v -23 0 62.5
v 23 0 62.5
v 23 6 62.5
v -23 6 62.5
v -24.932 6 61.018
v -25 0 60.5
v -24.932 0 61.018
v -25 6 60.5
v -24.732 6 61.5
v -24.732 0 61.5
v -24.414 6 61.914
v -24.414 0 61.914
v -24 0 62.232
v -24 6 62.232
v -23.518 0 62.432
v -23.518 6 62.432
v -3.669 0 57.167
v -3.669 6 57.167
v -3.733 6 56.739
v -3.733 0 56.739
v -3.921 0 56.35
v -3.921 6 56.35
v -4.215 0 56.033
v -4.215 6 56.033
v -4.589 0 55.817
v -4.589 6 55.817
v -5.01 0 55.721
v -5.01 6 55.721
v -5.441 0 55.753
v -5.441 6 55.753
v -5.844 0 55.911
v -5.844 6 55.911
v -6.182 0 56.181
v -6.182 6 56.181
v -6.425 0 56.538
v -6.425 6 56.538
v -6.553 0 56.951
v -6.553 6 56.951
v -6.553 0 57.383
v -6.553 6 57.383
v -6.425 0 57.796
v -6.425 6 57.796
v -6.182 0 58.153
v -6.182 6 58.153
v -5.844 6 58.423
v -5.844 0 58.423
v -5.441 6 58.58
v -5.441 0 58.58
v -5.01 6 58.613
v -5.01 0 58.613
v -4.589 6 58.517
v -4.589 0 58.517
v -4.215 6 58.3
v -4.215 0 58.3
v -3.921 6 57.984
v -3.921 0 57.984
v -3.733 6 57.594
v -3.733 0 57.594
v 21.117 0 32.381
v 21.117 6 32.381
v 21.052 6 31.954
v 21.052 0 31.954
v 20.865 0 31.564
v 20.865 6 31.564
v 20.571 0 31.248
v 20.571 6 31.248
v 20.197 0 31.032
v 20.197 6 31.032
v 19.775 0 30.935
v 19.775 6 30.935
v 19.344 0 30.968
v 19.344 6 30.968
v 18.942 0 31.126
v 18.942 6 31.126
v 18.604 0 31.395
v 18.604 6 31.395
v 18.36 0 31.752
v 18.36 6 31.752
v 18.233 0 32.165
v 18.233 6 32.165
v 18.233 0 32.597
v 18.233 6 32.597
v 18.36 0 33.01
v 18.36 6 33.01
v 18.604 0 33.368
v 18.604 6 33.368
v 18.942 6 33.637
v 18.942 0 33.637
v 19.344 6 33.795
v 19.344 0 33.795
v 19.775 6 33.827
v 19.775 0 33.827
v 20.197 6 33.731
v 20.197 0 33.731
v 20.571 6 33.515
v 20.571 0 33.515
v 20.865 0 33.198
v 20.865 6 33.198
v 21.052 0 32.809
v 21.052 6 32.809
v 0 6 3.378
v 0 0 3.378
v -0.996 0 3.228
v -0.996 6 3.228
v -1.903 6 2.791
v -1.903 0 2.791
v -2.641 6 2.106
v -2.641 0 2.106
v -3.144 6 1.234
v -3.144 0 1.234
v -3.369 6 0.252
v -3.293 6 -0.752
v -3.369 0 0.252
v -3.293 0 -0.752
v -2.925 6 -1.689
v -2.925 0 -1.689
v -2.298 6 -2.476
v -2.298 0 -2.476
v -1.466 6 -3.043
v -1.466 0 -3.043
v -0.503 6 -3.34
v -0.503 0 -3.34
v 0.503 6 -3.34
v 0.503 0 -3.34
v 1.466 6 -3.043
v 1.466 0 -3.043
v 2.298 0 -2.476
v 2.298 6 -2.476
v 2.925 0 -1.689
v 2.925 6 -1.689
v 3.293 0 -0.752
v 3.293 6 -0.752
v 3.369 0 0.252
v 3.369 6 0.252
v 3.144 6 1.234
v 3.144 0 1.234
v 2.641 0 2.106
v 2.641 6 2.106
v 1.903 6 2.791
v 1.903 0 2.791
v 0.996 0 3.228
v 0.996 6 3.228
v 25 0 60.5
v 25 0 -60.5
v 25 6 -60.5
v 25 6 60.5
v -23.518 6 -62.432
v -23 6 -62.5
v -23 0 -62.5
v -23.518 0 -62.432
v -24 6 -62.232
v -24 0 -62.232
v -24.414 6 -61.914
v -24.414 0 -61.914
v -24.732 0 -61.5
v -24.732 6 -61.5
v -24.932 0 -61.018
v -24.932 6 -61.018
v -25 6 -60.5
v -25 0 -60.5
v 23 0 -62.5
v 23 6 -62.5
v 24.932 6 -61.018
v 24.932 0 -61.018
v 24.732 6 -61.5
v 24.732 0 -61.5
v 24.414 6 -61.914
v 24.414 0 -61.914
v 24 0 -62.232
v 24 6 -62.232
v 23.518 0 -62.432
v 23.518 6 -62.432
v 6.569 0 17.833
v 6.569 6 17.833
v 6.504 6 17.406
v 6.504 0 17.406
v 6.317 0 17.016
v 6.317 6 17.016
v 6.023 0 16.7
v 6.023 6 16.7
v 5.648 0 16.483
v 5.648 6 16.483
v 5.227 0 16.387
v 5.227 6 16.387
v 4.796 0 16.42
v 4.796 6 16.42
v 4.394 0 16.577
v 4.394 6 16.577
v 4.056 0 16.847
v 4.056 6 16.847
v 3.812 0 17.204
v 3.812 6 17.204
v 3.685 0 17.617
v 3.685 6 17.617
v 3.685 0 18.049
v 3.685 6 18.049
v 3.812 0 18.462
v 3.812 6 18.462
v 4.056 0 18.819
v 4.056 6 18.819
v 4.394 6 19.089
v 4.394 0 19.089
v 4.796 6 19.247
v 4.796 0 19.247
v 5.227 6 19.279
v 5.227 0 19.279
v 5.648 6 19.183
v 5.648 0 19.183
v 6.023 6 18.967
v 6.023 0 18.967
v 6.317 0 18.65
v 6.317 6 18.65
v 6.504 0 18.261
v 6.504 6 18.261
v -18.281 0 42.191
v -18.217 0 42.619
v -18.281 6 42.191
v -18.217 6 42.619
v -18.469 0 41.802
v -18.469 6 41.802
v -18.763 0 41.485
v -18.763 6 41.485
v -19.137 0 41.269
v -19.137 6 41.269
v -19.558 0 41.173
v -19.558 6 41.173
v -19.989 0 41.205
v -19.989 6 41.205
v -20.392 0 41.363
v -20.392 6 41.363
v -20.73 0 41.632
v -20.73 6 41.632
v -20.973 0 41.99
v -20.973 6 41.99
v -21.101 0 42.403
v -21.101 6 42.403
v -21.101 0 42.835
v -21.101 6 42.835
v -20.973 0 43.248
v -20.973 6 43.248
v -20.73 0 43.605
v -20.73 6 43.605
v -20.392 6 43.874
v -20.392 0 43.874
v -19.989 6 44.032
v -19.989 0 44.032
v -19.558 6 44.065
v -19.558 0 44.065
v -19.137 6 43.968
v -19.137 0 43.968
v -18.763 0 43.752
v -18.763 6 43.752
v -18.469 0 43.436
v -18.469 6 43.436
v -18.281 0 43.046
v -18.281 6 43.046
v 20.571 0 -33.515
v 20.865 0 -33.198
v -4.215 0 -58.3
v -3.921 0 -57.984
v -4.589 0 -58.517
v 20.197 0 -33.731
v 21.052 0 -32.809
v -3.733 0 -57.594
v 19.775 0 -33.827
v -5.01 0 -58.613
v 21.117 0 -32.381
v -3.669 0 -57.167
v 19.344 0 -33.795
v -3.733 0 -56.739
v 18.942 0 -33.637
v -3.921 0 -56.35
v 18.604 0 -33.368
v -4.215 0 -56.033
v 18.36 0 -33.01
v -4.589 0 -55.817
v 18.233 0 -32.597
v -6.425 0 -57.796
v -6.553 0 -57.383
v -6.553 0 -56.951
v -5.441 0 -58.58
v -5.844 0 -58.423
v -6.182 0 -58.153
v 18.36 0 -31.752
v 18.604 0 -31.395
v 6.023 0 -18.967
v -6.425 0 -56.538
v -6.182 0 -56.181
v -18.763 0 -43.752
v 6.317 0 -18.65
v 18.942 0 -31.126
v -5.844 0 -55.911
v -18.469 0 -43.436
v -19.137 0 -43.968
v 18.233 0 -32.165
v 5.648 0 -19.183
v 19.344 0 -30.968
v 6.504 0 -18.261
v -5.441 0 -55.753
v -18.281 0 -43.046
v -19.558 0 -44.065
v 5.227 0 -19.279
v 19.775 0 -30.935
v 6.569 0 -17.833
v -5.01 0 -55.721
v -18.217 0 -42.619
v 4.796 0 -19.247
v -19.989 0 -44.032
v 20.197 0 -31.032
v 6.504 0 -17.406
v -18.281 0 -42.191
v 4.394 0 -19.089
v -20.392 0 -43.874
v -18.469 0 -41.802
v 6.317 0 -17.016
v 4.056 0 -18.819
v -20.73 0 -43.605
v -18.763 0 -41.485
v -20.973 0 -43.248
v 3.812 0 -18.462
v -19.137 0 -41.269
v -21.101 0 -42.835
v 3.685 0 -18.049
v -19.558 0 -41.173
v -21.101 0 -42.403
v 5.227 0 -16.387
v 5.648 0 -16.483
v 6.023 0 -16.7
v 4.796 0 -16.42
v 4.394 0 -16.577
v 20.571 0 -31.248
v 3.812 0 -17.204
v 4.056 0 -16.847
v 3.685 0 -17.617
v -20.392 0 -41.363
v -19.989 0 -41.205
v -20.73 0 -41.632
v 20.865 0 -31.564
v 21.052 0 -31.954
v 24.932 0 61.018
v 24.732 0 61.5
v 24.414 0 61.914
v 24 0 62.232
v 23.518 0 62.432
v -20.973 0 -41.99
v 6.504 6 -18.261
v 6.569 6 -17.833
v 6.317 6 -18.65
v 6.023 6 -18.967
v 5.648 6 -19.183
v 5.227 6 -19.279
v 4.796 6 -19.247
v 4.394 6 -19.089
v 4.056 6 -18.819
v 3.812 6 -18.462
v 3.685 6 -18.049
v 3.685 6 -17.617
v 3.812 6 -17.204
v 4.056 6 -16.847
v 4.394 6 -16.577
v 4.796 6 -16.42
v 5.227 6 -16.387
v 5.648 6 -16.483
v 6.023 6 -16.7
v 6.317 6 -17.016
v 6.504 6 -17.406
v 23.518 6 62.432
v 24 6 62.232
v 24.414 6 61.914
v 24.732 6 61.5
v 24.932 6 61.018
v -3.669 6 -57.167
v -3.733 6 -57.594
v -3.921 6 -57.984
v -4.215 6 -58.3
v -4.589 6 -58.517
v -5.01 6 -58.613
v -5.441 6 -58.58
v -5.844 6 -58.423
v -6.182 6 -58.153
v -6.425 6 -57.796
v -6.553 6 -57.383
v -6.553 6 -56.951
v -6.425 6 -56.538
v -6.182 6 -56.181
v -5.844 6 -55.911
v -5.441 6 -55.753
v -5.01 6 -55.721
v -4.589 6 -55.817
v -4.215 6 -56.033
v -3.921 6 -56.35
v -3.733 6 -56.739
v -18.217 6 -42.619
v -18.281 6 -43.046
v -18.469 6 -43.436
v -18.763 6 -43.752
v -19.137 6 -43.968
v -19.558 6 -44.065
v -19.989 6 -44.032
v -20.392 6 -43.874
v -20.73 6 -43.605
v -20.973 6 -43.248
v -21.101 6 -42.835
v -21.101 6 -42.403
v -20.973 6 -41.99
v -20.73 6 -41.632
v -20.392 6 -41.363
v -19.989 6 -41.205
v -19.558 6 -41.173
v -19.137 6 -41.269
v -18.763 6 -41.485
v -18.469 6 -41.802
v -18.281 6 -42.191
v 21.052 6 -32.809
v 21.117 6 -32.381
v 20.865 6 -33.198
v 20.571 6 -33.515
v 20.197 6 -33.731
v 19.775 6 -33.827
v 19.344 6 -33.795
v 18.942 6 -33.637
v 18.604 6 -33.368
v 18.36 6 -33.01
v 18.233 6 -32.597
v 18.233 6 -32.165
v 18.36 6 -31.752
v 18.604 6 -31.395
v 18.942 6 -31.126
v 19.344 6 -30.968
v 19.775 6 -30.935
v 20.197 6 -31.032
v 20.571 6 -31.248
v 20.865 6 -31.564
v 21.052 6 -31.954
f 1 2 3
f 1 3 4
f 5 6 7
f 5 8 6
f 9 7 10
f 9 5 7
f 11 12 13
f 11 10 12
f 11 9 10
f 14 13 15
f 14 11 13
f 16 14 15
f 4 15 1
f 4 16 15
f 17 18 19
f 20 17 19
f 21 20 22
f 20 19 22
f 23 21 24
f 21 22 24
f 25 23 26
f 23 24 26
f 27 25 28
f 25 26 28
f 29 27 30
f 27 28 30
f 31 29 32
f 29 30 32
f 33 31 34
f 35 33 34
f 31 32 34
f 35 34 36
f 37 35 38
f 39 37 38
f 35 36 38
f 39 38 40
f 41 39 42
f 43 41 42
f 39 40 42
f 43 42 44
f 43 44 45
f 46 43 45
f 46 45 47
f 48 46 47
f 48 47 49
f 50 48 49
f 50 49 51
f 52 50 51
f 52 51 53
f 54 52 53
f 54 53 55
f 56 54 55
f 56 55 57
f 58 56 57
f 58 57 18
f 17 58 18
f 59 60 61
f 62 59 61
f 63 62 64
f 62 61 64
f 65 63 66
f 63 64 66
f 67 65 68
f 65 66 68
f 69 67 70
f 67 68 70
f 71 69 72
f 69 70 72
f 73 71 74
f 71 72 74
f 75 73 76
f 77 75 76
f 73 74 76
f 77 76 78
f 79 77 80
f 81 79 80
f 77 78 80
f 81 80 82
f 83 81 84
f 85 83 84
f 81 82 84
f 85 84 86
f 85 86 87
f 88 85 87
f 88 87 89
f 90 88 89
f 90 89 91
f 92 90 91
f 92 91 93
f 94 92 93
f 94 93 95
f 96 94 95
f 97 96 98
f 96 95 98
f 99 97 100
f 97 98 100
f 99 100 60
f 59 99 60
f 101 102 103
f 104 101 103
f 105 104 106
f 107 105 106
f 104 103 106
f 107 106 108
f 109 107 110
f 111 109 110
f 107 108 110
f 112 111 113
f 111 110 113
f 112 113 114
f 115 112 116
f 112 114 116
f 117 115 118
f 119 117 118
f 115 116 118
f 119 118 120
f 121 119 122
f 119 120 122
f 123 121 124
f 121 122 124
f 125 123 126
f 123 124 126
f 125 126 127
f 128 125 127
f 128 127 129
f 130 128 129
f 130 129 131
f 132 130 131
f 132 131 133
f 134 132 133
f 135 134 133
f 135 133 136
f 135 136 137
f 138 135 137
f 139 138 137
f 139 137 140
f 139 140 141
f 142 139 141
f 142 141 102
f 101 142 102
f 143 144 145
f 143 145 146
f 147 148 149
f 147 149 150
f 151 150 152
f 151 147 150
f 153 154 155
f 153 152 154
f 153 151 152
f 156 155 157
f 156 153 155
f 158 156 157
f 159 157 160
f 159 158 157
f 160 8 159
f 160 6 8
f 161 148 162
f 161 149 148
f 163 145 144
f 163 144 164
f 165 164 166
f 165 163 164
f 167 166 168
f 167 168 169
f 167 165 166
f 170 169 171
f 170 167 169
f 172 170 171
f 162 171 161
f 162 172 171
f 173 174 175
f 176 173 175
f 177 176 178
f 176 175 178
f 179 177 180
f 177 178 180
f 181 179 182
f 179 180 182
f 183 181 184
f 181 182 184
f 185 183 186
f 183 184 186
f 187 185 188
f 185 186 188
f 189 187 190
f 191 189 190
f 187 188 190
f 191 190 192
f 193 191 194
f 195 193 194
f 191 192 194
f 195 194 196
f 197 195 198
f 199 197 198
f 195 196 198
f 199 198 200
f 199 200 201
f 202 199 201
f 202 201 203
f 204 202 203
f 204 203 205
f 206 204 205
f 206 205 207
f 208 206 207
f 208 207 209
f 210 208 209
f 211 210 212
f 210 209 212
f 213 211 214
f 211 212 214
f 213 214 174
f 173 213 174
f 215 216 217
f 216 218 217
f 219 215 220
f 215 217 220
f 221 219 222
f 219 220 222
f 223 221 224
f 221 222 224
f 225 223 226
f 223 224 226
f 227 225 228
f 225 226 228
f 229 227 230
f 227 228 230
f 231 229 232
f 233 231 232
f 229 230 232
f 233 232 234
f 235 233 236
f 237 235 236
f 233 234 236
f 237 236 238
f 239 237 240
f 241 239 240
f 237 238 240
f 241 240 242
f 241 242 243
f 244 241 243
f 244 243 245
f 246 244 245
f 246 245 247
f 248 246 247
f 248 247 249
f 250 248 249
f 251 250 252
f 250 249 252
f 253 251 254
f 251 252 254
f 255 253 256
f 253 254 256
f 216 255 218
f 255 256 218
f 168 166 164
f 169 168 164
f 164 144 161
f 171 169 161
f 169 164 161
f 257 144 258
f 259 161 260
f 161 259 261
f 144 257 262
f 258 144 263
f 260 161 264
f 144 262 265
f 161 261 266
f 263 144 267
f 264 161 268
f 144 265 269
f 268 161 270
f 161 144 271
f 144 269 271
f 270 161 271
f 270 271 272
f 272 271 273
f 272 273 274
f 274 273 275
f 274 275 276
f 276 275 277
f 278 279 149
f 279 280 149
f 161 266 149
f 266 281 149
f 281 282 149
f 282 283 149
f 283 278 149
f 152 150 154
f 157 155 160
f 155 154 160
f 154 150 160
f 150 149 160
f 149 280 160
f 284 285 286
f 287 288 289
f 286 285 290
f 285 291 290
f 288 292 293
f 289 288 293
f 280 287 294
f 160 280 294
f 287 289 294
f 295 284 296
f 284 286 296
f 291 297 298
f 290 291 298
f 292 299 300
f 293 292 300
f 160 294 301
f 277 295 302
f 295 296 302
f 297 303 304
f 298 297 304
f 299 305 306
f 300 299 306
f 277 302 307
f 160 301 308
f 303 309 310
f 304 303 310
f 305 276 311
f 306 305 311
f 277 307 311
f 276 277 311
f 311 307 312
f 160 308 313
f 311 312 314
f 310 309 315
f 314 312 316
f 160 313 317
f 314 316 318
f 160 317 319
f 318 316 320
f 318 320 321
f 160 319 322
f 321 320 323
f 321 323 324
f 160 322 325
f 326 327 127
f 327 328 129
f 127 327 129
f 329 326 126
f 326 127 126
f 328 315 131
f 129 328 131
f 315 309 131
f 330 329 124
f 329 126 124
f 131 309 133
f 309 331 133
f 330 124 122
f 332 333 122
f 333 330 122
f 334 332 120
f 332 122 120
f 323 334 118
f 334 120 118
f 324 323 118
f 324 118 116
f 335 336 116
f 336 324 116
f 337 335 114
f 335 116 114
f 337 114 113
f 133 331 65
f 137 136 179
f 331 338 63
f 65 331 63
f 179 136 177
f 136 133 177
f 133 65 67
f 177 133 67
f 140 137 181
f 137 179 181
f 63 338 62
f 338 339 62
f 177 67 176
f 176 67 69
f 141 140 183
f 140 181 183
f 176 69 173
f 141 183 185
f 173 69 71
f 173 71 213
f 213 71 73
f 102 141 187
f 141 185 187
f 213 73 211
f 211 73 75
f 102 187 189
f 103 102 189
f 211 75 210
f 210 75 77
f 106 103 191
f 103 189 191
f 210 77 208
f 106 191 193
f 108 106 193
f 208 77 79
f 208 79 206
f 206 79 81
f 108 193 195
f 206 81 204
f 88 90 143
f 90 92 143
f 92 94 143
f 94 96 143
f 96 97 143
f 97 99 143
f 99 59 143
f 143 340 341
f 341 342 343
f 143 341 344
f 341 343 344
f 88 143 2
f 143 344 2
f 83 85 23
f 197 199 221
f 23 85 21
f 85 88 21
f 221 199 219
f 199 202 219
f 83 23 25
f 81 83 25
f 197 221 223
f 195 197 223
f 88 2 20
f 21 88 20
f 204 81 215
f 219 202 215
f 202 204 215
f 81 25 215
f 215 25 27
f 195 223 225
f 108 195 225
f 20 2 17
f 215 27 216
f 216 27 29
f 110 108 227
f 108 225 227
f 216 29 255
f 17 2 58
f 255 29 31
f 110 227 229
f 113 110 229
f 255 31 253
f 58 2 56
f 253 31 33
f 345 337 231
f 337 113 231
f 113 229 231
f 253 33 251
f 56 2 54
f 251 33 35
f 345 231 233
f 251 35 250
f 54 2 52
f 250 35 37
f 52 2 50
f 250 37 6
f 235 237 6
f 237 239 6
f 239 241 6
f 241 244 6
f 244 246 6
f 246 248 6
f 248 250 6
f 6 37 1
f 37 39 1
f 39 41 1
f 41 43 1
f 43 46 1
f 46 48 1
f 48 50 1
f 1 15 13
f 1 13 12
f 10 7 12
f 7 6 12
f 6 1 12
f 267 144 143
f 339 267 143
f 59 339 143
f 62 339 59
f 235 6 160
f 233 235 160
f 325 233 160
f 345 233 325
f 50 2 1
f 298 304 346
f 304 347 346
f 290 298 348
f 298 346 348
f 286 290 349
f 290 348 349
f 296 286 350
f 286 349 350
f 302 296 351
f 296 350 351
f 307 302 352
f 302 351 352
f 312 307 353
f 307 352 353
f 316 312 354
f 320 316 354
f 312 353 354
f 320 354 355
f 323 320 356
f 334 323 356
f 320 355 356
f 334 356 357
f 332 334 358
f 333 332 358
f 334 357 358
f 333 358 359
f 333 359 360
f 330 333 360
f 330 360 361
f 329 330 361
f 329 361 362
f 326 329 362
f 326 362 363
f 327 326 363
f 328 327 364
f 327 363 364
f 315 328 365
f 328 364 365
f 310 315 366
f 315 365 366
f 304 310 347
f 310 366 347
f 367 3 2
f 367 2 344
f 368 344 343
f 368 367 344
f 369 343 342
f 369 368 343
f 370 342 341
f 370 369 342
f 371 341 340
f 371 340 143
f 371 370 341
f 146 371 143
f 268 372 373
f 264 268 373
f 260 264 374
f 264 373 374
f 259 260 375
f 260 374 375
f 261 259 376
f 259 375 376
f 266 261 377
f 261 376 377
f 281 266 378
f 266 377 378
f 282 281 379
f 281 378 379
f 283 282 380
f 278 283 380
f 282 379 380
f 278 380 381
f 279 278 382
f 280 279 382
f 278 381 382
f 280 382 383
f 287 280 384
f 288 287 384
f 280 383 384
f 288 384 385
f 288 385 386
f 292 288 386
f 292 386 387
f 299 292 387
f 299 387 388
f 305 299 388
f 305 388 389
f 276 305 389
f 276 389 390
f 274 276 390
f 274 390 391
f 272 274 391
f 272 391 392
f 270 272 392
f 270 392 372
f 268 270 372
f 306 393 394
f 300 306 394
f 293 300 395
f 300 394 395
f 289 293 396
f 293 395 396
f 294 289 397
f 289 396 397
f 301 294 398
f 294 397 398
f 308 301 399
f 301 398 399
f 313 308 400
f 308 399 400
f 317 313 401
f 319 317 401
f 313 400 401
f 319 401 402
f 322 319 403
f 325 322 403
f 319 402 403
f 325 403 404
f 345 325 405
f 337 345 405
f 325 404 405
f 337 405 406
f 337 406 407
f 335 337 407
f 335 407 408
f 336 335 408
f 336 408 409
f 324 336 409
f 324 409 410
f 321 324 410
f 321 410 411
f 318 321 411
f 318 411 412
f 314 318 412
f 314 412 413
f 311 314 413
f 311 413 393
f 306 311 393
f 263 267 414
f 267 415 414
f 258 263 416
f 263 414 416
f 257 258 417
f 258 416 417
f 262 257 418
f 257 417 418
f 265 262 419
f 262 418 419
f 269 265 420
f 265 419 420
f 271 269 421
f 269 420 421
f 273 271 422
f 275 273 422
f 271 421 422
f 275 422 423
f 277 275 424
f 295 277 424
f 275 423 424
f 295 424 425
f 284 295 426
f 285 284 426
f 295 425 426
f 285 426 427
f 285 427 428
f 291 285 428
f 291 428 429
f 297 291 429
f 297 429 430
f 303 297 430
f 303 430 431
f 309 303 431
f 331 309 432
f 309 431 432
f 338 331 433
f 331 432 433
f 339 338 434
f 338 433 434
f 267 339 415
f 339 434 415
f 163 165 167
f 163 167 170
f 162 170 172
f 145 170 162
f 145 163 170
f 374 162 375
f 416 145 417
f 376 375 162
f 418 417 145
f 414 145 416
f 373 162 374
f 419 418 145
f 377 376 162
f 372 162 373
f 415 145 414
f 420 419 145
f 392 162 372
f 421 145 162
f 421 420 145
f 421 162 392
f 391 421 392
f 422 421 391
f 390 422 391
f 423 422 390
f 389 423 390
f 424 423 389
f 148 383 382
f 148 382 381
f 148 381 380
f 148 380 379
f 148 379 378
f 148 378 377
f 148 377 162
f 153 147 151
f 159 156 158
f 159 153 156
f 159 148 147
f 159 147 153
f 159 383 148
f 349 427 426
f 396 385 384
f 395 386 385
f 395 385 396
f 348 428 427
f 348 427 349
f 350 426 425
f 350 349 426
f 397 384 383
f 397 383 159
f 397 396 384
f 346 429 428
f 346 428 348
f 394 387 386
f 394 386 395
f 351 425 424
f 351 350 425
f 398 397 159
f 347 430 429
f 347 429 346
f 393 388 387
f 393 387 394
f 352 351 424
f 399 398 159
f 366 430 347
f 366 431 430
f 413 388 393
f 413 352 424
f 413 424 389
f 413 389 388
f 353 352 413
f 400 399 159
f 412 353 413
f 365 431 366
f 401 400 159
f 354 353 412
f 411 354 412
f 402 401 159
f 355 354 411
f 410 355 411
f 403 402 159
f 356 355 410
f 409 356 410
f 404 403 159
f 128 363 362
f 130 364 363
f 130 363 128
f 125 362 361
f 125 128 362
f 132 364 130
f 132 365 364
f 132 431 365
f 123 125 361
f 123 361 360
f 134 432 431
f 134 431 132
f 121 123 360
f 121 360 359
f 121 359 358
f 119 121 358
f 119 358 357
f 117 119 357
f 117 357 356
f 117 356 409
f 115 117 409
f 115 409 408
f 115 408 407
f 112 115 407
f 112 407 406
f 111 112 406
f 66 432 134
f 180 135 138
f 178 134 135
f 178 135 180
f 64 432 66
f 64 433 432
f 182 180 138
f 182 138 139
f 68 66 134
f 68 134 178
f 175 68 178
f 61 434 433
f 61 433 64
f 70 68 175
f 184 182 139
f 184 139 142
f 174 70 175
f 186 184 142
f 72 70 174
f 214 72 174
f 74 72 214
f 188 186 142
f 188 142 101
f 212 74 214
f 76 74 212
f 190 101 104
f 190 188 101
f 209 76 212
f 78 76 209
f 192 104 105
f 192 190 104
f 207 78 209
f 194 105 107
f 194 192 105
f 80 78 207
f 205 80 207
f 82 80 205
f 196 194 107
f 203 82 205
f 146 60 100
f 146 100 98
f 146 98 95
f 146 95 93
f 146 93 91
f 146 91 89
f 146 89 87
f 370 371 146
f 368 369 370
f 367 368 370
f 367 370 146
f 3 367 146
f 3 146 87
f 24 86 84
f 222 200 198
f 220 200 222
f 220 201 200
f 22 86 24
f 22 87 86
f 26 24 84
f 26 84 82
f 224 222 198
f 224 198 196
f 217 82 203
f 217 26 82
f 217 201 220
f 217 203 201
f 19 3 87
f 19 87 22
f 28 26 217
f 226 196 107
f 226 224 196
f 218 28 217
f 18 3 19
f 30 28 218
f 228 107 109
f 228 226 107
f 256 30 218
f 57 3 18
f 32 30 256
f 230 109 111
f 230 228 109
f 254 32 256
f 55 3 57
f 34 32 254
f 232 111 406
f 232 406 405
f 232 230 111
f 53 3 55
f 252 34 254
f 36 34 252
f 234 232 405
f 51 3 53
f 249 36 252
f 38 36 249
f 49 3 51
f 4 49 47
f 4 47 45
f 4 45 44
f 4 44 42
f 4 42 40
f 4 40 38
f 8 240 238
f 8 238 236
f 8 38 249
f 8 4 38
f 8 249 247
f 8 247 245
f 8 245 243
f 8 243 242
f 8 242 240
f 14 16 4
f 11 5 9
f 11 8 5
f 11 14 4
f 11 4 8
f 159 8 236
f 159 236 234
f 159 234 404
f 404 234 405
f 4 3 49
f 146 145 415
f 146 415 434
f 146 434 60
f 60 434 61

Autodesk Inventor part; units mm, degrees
ref_plane "YZ Plane" through (0, 0, 0) normal (1, 0, 0) x (0, 1, 0)
ref_plane "XZ Plane" through (0, 0, 0) normal (0, 1, 0) x (-1, 0, 0)
ref_plane "XY Plane" through (0, 0, 0) normal (0, 0, 1) x (1, 0, 0)
sketch "Sketch1" plane through (0, 0, 0) normal (0, 1, 0) x (-1, 0, 0)
  line L0 (-25, 62.5) -> (25, 62.5)
  line L1 (25, 62.5) -> (25, -62.5)
  line L2 (25, -62.5) -> (-25, -62.5)
  line L3 (-25, -62.5) -> (-25, 62.5)
  line L4 (-25, 62.5) -> (25, -62.5) construction
  line L5 (25, 62.5) -> (-25, -62.5) construction
  point P0 (0, 0)
  dimension "d0" = 125
  dimension "d1" = 50
extrude "Extrusion1" add sketch "Sketch1" along normal blind 6
sketch "Sketch3" plane through (0, 6, 0) normal (0, 1, 0) x (1, 0, 0)
  line L0 (25, 62.5) -> (-25, 62.5) projected
  line L1 (-25, -62.5) -> (25, -62.5) projected
  line L2 (-19.6668, -42.6187) -> (-5.1187, -57.1668)
  line L3 (-5.1187, -57.1668) -> (19.6668, -32.3813)
  line L4 (19.6668, -32.3813) -> (5.1187, -17.8332)
  line L5 (5.1187, -17.8332) -> (-19.6668, -42.6187)
  line L6 (25, -62.5) -> (25, 62.5) projected
  line L7 (-25, 62.5) -> (-25, -62.5) projected
  line L8 (5.1187, 17.8332) -> (19.6668, 32.3813)
  line L9 (19.6668, 32.3813) -> (-5.1187, 57.1668)
  line L10 (-5.1187, 57.1668) -> (-19.6668, 42.6187)
  line L11 (-19.6668, 42.6187) -> (5.1187, 17.8332)
  circle A0 centre (-19.6668, -42.6187) radius 1.45
  circle A1 centre (5.1187, -17.8332) radius 1.45
  circle A2 centre (19.6668, -32.3813) radius 1.45
  circle A3 centre (-5.1187, -57.1668) radius 1.45
  circle A4 centre (-19.6668, 42.6187) radius 1.45
  circle A5 centre (-5.1187, 57.1668) radius 1.45
  circle A6 centre (19.6668, 32.3813) radius 1.45
  circle A7 centre (5.1187, 17.8332) radius 1.45
  point P0 (0, 0)
  point P1 (0, -37.5)
  point P2 (0, 37.5)
  point P3 (0, -62.5)
  point P4 (0, 62.5)
  dimension "d5" = 125
  dimension "d7" = 35.052
  dimension "d8" = 20.574
  dimension "d9" = 50
  dimension "d10" = 10.287
  dimension "d11" = 17.526
  dimension "d12" = 35.052
  dimension "d13" = 20.574
  dimension "d14" = 17.526
  dimension "d15" = 10.287
  dimension "d16" = 2.9
  dimension "d17" = 2.9
  dimension "d18" = 2.9
  dimension "d19" = 2.9
  dimension "d20" = 2.9
  dimension "d21" = 2.9
  dimension "d22" = 2.9
  dimension "d23" = 2.9
  dimension "d24" = 25
  dimension "d25" = 25
extrude "Extrusion2" cut sketch "Sketch3" against normal through all contours L5 A0 L2 | L2 A0 L5 | A3 L3 L2 | L2 L3 A3 | A1 L4 L5 | L5 L4 A1 | A2 L4 L3 | L3 L4 A2 | L11 A7 L8 | L8 A7 L11 | A6 L9 L8 | L8 L9 A6 | A4 L10 L11 | L11 L10 A4 | A5 L10 L9 | L9 L10 A5
hole "Hole1" at (0, 6, 0) direction (0, -1, 0) diameter 6.756 end through all clearance for "Hex Head Bolt" size "1/4" standard "Ansi Unified Screw Threads"
fillet "Fillet1" radius 2 4 edges at (25, 3, 62.5) (25, 3, -62.5) (-25, 3, -62.5) (-25, 3, 62.5)
equation "\"d10\" = 0.5 * d8"
equation "\"d11\" = 0.5 * d7"
equation "\"d14\" = 0.5 * d12"
equation "\"d15\" = 0.5 * d13"
properties part number "ShuttleValveShelf"
